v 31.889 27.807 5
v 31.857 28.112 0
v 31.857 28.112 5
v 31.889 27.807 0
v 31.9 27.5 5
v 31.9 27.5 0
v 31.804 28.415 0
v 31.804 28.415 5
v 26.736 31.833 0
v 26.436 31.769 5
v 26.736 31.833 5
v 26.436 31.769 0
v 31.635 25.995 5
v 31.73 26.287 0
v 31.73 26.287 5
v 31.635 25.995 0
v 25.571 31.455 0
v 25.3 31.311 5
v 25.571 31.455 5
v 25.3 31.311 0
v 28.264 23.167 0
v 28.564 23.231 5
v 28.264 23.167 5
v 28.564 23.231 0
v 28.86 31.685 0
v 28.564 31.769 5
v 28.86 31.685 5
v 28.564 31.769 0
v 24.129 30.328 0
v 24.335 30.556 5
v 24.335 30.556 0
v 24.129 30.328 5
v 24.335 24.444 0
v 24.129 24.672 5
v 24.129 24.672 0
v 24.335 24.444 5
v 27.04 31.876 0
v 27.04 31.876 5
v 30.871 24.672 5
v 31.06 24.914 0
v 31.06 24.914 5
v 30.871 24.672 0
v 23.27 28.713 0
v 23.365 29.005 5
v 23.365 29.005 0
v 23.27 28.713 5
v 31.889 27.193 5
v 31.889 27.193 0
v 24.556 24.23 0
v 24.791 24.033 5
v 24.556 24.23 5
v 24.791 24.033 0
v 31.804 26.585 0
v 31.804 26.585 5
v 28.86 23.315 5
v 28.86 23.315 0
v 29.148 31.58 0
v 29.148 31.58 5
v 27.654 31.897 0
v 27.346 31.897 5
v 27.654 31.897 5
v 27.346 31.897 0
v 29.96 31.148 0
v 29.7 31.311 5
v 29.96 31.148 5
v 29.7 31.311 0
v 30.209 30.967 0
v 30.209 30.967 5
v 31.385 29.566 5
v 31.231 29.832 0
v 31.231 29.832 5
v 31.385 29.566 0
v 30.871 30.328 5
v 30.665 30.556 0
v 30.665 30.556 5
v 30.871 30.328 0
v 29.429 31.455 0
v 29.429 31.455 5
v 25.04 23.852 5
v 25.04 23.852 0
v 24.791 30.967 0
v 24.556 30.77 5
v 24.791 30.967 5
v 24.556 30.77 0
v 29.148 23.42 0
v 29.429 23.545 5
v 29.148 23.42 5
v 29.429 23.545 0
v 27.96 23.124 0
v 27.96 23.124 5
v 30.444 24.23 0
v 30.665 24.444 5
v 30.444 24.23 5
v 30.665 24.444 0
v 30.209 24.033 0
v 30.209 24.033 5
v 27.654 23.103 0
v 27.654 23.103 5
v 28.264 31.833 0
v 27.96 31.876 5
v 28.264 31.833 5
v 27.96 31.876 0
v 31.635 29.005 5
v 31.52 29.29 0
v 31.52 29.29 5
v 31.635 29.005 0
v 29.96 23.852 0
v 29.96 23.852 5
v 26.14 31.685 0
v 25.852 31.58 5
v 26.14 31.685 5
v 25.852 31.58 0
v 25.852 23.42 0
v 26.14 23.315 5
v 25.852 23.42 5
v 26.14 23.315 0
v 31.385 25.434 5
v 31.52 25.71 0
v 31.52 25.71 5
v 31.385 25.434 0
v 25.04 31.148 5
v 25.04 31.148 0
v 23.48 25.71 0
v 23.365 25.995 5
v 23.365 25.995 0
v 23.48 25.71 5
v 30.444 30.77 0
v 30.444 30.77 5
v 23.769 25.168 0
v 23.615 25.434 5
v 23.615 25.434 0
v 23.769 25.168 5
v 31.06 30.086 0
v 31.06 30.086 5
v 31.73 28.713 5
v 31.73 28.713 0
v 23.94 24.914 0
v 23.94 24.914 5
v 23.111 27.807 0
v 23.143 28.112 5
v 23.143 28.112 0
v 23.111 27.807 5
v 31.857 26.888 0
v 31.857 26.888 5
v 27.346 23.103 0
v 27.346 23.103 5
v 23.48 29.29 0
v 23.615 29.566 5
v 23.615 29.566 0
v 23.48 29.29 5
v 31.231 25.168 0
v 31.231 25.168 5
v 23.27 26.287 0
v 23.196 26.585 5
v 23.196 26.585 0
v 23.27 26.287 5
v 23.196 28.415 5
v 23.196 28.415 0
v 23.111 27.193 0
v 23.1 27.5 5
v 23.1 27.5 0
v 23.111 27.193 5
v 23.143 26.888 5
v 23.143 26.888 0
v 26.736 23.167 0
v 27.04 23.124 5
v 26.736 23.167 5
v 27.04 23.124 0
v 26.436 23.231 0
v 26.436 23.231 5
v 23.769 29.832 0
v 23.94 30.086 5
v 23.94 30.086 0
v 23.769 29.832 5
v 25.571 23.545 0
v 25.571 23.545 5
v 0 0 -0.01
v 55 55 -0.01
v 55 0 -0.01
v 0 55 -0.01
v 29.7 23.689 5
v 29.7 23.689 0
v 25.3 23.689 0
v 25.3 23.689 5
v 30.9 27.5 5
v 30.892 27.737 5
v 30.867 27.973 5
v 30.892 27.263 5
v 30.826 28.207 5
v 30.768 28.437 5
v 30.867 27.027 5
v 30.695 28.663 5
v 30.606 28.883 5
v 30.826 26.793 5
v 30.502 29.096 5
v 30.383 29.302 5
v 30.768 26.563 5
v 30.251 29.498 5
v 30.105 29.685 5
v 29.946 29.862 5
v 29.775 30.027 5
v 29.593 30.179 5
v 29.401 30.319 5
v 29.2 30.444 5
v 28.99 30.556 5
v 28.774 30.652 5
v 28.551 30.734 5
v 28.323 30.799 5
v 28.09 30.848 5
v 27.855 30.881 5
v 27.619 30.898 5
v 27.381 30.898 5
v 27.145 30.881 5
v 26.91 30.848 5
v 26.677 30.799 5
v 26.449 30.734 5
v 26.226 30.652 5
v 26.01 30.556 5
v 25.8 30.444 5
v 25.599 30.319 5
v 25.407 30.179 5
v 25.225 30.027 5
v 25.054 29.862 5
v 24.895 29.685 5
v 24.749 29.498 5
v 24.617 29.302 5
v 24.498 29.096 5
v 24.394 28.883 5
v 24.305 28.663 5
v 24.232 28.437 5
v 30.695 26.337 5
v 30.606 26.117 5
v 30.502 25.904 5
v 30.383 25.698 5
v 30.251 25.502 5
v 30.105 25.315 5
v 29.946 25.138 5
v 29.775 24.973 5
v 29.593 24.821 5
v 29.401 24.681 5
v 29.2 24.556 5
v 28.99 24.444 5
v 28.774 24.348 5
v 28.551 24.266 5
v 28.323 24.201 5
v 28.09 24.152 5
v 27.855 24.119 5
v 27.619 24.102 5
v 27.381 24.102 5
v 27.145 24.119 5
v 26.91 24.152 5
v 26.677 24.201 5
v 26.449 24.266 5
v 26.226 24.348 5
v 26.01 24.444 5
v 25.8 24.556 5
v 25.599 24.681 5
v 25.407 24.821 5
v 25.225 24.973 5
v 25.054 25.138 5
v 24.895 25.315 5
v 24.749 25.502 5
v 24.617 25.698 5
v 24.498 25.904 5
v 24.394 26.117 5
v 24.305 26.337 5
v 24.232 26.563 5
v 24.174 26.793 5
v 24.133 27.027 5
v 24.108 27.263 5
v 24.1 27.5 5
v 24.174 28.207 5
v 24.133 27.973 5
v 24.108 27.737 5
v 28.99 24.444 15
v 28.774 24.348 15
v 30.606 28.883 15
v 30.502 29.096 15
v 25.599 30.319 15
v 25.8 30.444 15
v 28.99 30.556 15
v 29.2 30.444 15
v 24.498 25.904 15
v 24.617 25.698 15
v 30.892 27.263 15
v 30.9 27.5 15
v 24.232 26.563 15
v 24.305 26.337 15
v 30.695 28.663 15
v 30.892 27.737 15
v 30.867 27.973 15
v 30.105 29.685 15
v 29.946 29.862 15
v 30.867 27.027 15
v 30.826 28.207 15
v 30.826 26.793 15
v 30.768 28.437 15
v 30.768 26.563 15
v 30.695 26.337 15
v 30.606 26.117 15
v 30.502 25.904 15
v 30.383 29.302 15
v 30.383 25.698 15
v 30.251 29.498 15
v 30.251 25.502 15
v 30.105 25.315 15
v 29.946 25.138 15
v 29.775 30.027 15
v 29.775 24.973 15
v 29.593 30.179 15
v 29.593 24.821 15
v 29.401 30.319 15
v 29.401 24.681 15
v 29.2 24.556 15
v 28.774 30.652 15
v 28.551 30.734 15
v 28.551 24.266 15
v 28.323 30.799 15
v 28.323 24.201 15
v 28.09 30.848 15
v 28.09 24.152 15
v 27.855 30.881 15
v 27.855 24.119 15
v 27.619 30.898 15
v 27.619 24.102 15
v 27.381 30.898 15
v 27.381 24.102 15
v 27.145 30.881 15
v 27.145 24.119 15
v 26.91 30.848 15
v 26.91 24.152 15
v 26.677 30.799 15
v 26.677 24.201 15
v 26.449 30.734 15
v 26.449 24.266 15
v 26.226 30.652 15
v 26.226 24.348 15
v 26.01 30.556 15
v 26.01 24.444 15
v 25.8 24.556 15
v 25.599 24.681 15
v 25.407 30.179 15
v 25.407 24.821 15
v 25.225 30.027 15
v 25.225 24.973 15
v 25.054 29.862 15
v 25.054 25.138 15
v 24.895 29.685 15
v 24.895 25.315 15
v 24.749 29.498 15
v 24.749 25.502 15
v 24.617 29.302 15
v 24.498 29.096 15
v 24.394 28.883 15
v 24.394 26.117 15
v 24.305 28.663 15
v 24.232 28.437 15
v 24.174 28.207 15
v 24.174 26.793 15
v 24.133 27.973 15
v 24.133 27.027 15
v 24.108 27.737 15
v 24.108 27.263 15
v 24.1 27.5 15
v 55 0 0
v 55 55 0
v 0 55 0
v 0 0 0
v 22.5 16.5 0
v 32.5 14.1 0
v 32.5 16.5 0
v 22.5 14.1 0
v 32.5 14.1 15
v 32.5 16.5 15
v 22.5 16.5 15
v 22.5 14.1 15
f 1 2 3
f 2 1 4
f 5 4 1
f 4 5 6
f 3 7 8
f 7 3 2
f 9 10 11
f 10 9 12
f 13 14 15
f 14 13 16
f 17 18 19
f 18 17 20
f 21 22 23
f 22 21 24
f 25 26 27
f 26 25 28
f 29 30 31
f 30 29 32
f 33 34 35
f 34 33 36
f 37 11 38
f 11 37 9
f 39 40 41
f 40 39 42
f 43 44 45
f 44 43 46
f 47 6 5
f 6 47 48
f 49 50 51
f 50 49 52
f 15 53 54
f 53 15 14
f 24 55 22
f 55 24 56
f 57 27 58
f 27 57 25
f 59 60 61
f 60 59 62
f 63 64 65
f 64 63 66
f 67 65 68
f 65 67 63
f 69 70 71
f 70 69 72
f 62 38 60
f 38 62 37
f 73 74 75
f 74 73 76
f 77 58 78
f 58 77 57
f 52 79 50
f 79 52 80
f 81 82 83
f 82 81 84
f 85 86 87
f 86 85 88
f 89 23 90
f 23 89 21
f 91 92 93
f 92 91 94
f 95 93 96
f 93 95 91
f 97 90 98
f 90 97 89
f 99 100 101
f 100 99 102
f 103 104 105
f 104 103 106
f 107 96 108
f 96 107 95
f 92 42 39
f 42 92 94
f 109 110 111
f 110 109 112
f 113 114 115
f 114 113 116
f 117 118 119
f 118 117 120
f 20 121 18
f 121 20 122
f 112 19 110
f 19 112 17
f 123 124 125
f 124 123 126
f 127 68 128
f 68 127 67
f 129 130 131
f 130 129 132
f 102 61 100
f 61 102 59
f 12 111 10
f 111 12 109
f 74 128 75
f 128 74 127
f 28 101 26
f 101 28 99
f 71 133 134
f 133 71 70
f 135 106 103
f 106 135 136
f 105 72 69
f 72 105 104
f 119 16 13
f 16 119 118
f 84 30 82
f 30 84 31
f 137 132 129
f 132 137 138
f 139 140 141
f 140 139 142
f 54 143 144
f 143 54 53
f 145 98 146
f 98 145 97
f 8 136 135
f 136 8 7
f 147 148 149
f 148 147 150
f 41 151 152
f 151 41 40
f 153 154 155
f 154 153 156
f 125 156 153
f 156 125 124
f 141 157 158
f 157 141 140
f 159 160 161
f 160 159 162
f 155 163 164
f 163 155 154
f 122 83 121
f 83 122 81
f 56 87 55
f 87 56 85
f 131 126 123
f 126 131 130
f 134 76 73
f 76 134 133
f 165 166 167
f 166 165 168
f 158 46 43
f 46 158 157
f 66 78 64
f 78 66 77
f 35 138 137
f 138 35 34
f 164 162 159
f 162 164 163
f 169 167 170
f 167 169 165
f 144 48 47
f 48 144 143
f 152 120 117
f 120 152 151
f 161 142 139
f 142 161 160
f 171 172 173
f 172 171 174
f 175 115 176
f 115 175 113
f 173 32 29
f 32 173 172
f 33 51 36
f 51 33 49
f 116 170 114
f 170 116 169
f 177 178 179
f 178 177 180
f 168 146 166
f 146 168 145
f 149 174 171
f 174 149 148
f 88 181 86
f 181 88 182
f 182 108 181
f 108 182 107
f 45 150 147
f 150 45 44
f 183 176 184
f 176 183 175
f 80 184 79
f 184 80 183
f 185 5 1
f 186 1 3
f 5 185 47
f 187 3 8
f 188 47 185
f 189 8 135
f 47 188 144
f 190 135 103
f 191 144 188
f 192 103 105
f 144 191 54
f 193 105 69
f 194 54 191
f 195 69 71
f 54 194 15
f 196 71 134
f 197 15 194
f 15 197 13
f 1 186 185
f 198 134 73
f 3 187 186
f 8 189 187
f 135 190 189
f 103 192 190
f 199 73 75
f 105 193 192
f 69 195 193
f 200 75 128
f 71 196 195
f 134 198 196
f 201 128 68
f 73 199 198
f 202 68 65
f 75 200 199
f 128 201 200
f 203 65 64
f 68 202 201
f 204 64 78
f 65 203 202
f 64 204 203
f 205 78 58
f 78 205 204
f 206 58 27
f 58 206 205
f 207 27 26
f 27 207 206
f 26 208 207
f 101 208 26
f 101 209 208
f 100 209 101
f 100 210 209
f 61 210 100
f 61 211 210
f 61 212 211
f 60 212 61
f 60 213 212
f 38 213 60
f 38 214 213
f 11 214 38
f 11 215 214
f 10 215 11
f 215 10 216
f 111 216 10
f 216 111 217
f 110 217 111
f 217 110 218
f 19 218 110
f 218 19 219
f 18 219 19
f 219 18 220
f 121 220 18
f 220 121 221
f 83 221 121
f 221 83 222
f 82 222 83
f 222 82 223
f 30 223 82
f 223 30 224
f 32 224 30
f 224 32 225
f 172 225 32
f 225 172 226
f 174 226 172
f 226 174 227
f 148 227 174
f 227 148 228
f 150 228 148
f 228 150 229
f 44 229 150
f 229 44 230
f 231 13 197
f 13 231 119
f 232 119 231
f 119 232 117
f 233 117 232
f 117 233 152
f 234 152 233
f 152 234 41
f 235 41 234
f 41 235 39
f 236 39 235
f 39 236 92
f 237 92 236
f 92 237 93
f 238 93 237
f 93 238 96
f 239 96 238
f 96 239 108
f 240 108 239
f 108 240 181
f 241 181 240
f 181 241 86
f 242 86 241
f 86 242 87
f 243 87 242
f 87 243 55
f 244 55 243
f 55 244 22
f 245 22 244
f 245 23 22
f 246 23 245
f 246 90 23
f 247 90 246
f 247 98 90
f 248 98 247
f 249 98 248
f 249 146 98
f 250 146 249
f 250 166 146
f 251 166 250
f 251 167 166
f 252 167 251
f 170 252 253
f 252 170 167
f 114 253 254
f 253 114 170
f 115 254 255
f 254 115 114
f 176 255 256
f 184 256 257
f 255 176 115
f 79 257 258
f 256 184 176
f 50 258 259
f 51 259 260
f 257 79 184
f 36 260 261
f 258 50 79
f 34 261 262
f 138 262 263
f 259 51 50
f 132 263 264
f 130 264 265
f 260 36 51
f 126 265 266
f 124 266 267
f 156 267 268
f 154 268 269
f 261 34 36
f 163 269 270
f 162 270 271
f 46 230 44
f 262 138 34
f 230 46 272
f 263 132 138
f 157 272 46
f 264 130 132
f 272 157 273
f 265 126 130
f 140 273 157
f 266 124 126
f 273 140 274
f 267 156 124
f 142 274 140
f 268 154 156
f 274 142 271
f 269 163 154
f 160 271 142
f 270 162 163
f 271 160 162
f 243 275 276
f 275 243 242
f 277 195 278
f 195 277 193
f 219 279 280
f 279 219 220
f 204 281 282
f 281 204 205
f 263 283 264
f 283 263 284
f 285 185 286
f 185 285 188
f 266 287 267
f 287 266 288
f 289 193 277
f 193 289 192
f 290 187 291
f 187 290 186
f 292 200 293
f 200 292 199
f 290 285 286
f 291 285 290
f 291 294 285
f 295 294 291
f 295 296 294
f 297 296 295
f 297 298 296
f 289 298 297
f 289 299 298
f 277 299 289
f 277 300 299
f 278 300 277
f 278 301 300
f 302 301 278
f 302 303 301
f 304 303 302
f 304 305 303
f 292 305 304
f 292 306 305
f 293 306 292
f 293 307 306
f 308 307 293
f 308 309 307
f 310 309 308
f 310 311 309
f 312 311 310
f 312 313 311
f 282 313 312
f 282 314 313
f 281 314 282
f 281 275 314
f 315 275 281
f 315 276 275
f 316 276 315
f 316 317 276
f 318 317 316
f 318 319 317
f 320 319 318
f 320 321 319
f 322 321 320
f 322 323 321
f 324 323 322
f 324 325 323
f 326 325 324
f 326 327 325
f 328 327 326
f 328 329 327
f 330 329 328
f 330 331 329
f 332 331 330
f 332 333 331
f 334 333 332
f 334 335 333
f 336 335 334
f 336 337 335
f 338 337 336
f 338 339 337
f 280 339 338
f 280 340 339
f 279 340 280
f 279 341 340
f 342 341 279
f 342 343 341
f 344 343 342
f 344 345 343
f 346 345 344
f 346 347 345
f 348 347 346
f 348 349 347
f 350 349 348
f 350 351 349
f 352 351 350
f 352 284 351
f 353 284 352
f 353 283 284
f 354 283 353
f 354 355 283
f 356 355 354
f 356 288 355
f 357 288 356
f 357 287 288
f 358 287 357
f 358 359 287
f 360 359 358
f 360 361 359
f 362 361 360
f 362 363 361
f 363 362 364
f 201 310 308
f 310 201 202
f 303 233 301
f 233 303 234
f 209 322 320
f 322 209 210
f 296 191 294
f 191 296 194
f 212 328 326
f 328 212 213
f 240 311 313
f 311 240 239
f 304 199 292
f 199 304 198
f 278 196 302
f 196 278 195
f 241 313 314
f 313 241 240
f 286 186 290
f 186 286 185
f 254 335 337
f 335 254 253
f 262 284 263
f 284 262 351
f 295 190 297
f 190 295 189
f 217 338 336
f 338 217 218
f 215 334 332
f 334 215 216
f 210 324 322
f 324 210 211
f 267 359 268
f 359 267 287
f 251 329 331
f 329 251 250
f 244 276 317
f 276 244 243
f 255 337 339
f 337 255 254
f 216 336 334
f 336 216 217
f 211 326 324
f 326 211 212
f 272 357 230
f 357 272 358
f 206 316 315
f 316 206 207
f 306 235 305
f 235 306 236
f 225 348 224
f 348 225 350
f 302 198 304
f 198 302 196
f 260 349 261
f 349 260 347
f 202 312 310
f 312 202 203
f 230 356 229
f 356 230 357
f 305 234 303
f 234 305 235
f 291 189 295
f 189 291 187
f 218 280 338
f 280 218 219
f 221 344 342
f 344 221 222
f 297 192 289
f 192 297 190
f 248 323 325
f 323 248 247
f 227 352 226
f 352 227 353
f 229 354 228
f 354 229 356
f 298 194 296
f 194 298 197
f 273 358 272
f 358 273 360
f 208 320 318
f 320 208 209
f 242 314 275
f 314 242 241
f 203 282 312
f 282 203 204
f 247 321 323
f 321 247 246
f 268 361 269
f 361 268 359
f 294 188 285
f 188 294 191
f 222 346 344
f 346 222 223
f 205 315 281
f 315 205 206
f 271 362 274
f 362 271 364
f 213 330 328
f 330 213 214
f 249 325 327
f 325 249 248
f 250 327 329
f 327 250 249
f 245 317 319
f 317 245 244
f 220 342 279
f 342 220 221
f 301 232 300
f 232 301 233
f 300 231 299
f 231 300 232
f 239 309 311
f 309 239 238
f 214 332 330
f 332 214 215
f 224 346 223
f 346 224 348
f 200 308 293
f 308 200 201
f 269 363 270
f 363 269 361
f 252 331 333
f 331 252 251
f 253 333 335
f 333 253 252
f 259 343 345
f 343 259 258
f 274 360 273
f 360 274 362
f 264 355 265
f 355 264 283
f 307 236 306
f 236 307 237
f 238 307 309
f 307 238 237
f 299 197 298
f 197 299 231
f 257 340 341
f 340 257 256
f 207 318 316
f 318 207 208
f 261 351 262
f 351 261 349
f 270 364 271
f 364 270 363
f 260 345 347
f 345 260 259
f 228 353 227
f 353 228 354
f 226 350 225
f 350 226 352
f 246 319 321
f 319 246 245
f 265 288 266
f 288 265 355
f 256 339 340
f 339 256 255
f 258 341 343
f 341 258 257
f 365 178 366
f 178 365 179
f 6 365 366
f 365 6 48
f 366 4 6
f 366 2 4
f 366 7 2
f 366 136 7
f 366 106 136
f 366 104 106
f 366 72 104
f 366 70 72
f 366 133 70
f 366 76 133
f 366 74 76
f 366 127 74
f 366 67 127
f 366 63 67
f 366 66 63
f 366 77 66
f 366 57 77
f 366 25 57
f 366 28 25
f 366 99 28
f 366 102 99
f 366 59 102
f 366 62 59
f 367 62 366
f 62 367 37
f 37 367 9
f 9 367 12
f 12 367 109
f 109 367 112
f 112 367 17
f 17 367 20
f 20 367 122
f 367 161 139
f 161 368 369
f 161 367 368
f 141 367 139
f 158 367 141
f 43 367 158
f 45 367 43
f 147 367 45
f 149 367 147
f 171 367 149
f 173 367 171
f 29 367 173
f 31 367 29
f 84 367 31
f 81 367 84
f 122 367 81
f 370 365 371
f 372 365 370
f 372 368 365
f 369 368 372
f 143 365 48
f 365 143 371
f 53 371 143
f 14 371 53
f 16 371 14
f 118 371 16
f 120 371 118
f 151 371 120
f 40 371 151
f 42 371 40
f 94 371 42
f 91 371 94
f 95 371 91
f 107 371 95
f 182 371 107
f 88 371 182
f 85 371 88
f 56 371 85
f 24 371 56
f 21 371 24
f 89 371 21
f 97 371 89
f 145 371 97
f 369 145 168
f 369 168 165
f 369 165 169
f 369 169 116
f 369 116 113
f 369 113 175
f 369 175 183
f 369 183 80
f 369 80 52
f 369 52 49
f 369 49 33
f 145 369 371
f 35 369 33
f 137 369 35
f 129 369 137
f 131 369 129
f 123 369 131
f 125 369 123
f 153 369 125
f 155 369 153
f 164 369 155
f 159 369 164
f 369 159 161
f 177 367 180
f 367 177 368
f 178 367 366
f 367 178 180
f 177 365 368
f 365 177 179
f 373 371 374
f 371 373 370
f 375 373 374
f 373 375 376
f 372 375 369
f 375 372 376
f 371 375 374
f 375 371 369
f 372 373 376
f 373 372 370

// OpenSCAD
// file: ../Base/Rotation.scad
// Fischertechnik Box Foundation
// Geometry Helpers Rotation

include <PlacementOptions.scad>

// getRotatedSpace(space, rotation=NoRotation)
// Rotates the space dependent on the specified rotation

function getRotatedSpace(space, rotation=NoRotation) = [
    (rotation == Rotate90 || rotation == Rotate270) ? space.y : space.x,
    (rotation == Rotate90 || rotation == Rotate270) ? space.x : space.y
];

// Rotates the given space around the fixed left lower corner
// space = the space the children needs as width/depth list [width,depth]
// rotation = 0 Rotate0 degrees, 1 Rotate90 degrees, 2 Rotate180 degrees, 3 Rotate270 degrees (equivalent to -90)

module RotateFix(space, rotation=NoRotation) {
    dy = (rotation == Rotate0 || rotation == Rotate270) ? 0 :
        (rotation == Rotate90) ? space.x :
        space.y;
    dx = (rotation < Rotate180) ? 0 :
        (rotation == Rotate180) ? space.x :
        space.y;
    
    translate([dx, dy, 0])
        rotate([0, 0, rotations[rotation]])
            children();
}
// file: ../Base/Alignment.scad
// Fischertechnik Box Foundation
// Geometry Helpers Alignment

include <PlacementOptions.scad>

// getAlignedX(elementWidth, spaceWidth, align=AlignRight, offset=0)
// Gets the aligned X offset of an element with the given
// width in the given space.
// elementWidth = The width of the element to positon
// spaceWidth = The space where the element should be aligned
// align = 0 AlignLeft, 1 AlignCenter, 2 AlignRight
// offset = an optional offset from the aligned position. When
// aligned left or centered, then positive values are in X direction.
// When aligned right then positive values are in negative X direction.

function getAlignedX(elementWidth, spaceWidth, align=AlignRight, offset=0) =
    (align == AlignLeft) ?
        offset :
        ((align == AlignCenter) ?
        (spaceWidth - elementWidth)/2 + offset :
        spaceWidth - offset - elementWidth);

// getAlignedY(elementDepth, spaceDepth, align=AlignTop, offset=0)
// Gets the aligned Y offset of an element with the given
// depth in the given space.
// elementDepth = The depth of the element to positon
// spaceDepth = The space where the element should be aligned
// align = 0 AlignBottom, 1 AlignCenter, 2 AlignTop
// offset = an optional offset from the aligned position. When
// aligned bottom or centered, then positive values are in Y direction.
// When aligned top then positive values are in negative Y direction.

function getAlignedY(elementDepth, spaceDepth, align=AlignTop, offset=0) =
    (align == AlignBottom) ?
        offset :
        ((align == AlignCenter) ?
        (spaceDepth - elementDepth)/2 + offset :
        spaceDepth - offset - elementDepth);
// file: ../Base/PlacementOptions.scad
// Fischertechnik Box Foundation
// Placement Options

// Alignment
NoAlign = 0;
AlignLeft = 1;
AlignBottom = 2;
AlignCenter = 3;
AlignRight = 4;
AlignTop = 5;

// Element rotation degree steps
rotations = [0, -90, -180, -270];

// Rotation
NoRotation = 0;
Rotate0 = 0;
Rotate90 = 1;
Rotate180 = 2;
Rotate270 = 3;

// Docking (seen from above)
NoDock = -1;
DockLeft = 0;
DockTop = 1;
DockRight = 2;
DockCorner = 2;
DockBottom = 3;

// Web corners
LowerLeft = 0;
UpperLeft = 1;
UpperRight = 2;
LowerRight = 3;

// Web position relative to corner
LeftOfCorner = 0;
RightOfCorner = 1;

// Rails direction
Horizontal = true;
Vertical = false;
// file: ../Base/Boxes.scad
// Fischertechnik Box Foundation
// Pre-designed Boxes

use <Constants.scad>

include <PlacementOptions.scad>

box190Width = 190;
box190Depth = 130;
box130Width = 130;
box130Depth = 95;

// Values are from an original ec3 box
topBottomDifference = 1.5;
outerHeight = 40;
baseThickness = 1.8;
innerHeight = outerHeight - baseThickness;
stackExcess = 5.7;
radius = 3.5;
wallThickness = 1.5;
tolerance = 0.2;

boxWallThickness = wallThickness;
boxBaseThickness = baseThickness;
boxWebWidth = 3.0;

// getBoxWallThickness()
// Gets the wall thickness of a Fischertechnik Box
function getBoxWallThickness() = boxWallThickness;

// getBoxUsageHeight(height = 38.2)
// Gets the usable height of a Fischertechnik box
// height = Outer height of the box from the bottom to the upper edge.
function getBoxUsageHeight(height = outerHeight) = height - baseThickness - stackExcess;

// getBoxInnerHeight()
// Gets the inner height of a Fischertechnik box, including the stack excess
function getBoxInnerHeight() = innerHeight;

// getBoxBaseThickness()
// Gets the thickness of the Fischertechnik box base.
function getBoxBaseThickness() = boxBaseThickness;

// getBoxWebWidth()
// Gets the width of a box web
function getBoxWebWidth() = boxWebWidth;

// getBox190Space()
// Gets the usable inner space of a Box 190 as an x/y-list
function getBox190Space() = [
    box190Width - 2*getBoxWallThickness() - topBottomDifference, 
    box190Depth - 2*getBoxWallThickness() - topBottomDifference ];

// RoundedCornerPlate(width, depth, height, radius)
// Creates a body plate with rounded corners for a box. Used
// also to create the complete box with the hull module.
// width = Width of the plate
// depth = depth of the plate 
// height = thickness of the plate
// radius = radius of the rounded corner
module RoundedCornerPlate(width, depth, height, radius) {
    translate([radius, radius])
    hull() {
        w = width-2*radius;
        d = depth-2*radius;
        cube([w, d, height]);
        cylinder(height, r=radius, $fn=getFragments());
        translate([w, 0])
            cylinder(height, r=radius, $fn=getFragments());
        translate([w, d])
            cylinder(height, r=radius, $fn=getFragments());
        translate([0, d])
            cylinder(height, r=radius, $fn=getFragments());
    }
}

// BoxBase(width, depth)
// Creates an empty stackable Fischertechnik compatible box
// width = Outer width of the box (190, 130, ...)
// depth = Outer depth of the box (130, 95, ...)

module BoxBase(width, depth, height=outerHeight) {    
    thinPlate = 0.01;

    innerHeight = height - baseThickness;    
    
    module Body(tolerance=tolerance) {
        hull() {
            // Bottom with tolerance to fit into the original boxes when stacked
            translate([-wallThickness+tolerance, -wallThickness+tolerance, -baseThickness])
                RoundedCornerPlate(width-topBottomDifference-2*tolerance, depth-topBottomDifference-2*tolerance, thinPlate, radius);
            
            // Top
            translate([-wallThickness-topBottomDifference/2, -wallThickness-topBottomDifference/2, innerHeight-thinPlate])
                RoundedCornerPlate(width, depth, thinPlate, radius);
         }
    }

    module Cutoff() {
        hull() {
            coWidth = width - 2*wallThickness;
            coDepth = depth - 2*wallThickness;
            
            // Bottom
            RoundedCornerPlate(coWidth-topBottomDifference, coDepth-topBottomDifference, thinPlate, radius);

            // Top
            translate([-topBottomDifference/2, -topBottomDifference/2, innerHeight+thinPlate]) 
                RoundedCornerPlate(coWidth, coDepth, thinPlate, radius);
        }
    }
    
    difference() {        
        Body();
        Cutoff();
        stackOffset = innerHeight - stackExcess;
        translate([0, 0, stackOffset + baseThickness])
            Body(tolerance=0);
    }
}

// Creates the Fischertechnik empty box 130x190 mm and places it at position 0,0
// 190x130 are the outer sizes, the inner space is slightly smaller. Use getBox190Space() to get the inner sizes.
// The box is positioned that the usable inner space is at the 0,0,0 position.

module Box190() {
    BoxBase(box190Width, box190Depth);
}

// Gets the usable inner space of a Box 130 as an x/y-list
function getBox130Space() = [
    box130Width - 2*getBoxWallThickness() - topBottomDifference, 
    box130Depth - 2*getBoxWallThickness() - topBottomDifference ];

// Creates the Fischertechnik empty box 95x130 mm and places it at position 0,0
// 190x130 are the outer sizes, the inner space is slightly smaller. Use getBox190Space() to get the inner sizes.
// The box is positioned that the usable inner space is at the 0,0,0 position.

module Box130() {
    BoxBase(box130Width, box130Depth);
}

// Creates a web at the specified box walls
// corner 0 = LowerLeft, 1 = UpperLeft, 2 = UpperRight, 3 = LowerRight
// side 0 = LeftOfCorner, 1 = RightOfCorner
// distance = Distance in mm from the corner
// boxSpace = inner width and depth of the box (default: Box 190)
// webWidth = length of the web (default is 3 mms)
// webThickness = thickness of the web (default is 1 mm)
// height = Height of the web (standard is getBoxUsageHeight())
// sink = How much of the web is sunk into the wall

module BoxWeb(
    corner, 
    side, 
    distance, 
    boxSpace=getBox190Space(), 
    webWidth=getBoxWebWidth(), 
    webThickness=1.0, 
    height=getBoxUsageHeight(),
    sink = getBoxWallThickness()/2) {
    width = (corner % 2 == 0) ? 
            (side == LeftOfCorner ? webWidth : webThickness) :
            (side == LeftOfCorner ? webThickness : webWidth);

    depth = (corner % 2 == 0) ? 
            (side == RightOfCorner ? webWidth : webThickness) :
            (side == RightOfCorner ? webThickness : webWidth);
    
    xDiff = corner == LowerLeft ? 
                (side == LeftOfCorner ? -sink : distance) :
            (corner == UpperLeft ?                
                (side == LeftOfCorner ? distance : -sink) :
            (corner == UpperRight ?
                (side == LeftOfCorner ? boxSpace.x-webWidth+sink : boxSpace.x-distance-webThickness) :
                (side == LeftOfCorner ? boxSpace.x-distance-webThickness: boxSpace.x-webWidth+sink)));

    yDiff = corner == LowerLeft ? 
                (side == RightOfCorner ? -sink : distance) :
            (corner == UpperLeft ?
                (side == RightOfCorner ? boxSpace.y-distance-webThickness : boxSpace.y-webWidth+sink) :
            (corner == UpperRight ?
                (side == RightOfCorner ? boxSpace.y-webWidth+sink : boxSpace.y-distance-webThickness) :
                (side == RightOfCorner ? distance : -sink)));
    
    translate([xDiff, yDiff, -getExcess()])
        cube([width, depth, height + 2*getExcess()]);
}
// file: ../Base/Placement.scad
// Fischertechnik Box Foundation
// Geometry Helpers Placement

use <Constants.scad>
use <Alignment.scad>
use <Rotation.scad>
use <Boxes.scad>

include <PlacementOptions.scad>

// Place(x=0, y=0, elementSpace=[0,0], alignX=AlignLeft, alignY=AlignBottom, rotation=Rotate0, boxSpace=getBox190Space())
// Places the child at the specified position
// y = Y-Position. This is a relative position when an X aligment is specified.
// x = X-Position. This is a relative position when an Y aligment is specified.
// elementSpace = space of the element to be placed [x,y]
// alignX = -1=NoAlign, 0 AlignLeft, 1 AlignCenter, 3 AlignRight (elementSpace and boxSpace required!)
// alignY = -1=NoAlign, 2 AlignBottom, 1 AlignCenter, 4 AlignTop (elementSpace and boxSpace required!)
// rotation = 0 Rotate0 0 degrees, 1 Rotate90 90 degrees, 
// 2 Rotate180 180 degrees, 3 Rotate270 270 degrees (equivalent to -90)
// boxSpace = Inner space of the box where the placement occurs [x,y] - default is Box 190x130 inner space

module Place(x=0, y=0, elementSpace=[0,0], 
  alignX=AlignLeft, alignY=AlignBottom, 
  rotation=NoRotation, boxSpace=getBox190Space()) {

    module Position(x, y, space, rotation=Rotate0) {
        translate([x, y, 0])
            RotateFix(space, rotation)
                children();
    }

    space = getRotatedSpace(elementSpace, rotation);
    alignedX = getAlignedX(space.x, boxSpace.x, alignX, x);
    alignedY = getAlignedY(space.y, boxSpace.y, alignY, y);
    Position(alignedX, alignedY, elementSpace, rotation)
        children();
}

// Center(space=getBox130Space(), elementSpace=[0,0])
// space = Space where the children is centered. For cylinder use centered=true and no elementSpace.
// elementSpace = space of the element to be centered [x,y]

module Center(space=getBox190Space(), elementSpace=[0,0]) {
    Place(elementSpace=elementSpace, boxSpace=space, alignX=AlignCenter, alignY=AlignCenter)
        children();
}

// CenterHorizontal(width=0, y=0, offset=0, space=getBox130Space())
// width = Width of the element to be placed.
// y = Y position of the element
// offset = Offset from the center position (negative will be left of the center)
// space = Space where the element is placed

module CenterHorizontal(width=0, y=0, offset=0, space=getBox190Space()) {
    Place(x=offset, y=y, elementSpace=[width, 0], boxSpace=space, alignX=AlignCenter)
        children(0);
}

// CenterVertical(depth=0, x=0, offset=0, space=getBox130Space())
// depth = Depth of the element to be placed.
// x = X position of the element
// offset = Offset from the center position (negative will be down of the center)
// space = Space where the element is placed

module CenterVertical(depth=0, x=0, offset=0, space=getBox190Space()) {
    Place(x=x, y=offset, elementSpace=[0, depth], boxSpace=space, alignY=AlignCenter)
        children(0);
}

// getIsVertical(align)
// True if the specified alignment needs a vertical orientation for a divider (AlignRight, AlignLeft)

function getIsVertical(align) = (align == AlignRight || align == AlignLeft);

// getIsHorizontal(align)
// True if the specified alignment needs a horizontal orientation for a divider (AlignTop, AlignBottom)

function getIsHorizontal(align) = (align == AlignTop || align == AlignBottom);
// file: ../Base/Constants.scad
// Fischertechnik Box Foundation
// Constants

// Constant values necessary for multiple elements

// Base constants
dividerThickness = 1.2;
excess = 0.01;
fragments = 90;
tolerance = 0.8;

// Gets the thickness of a divider 
function getDividerThickness() = dividerThickness;

// Gets the excess that is used to merge walls into each other
function getExcess() = excess;

// Gets amount of fragments of a cylinder
function getFragments() = fragments;

// Gets the inner tolerance of a frame to each side
function getTolerance() = tolerance;


// Fischertechnik specific constants
axisDiameter = 4;
axisBottomDiameter = axisDiameter + 1;
axisTolerance = 0.2;
axisLockingLength = 8;

// Gets axis diameter of Fischertechnik axis
function getAxisDiameter() = axisDiameter;

// Gets axis diameter tolerance (subtracted for element axis)
function getAxisTolerance() = axisTolerance;

// Gets the axis diameter for standing axis
function getStandAxisDiameter() = getAxisDiameter() - getAxisTolerance();

// Gets axis bottom diameter for thicker part at the bottom
function getAxisBottomDiameter() = axisBottomDiameter;

// Gets the lengthh of the locking part of a locking axis
function getAxisLockingLength() = axisLockingLength;

// Studs

studHeight = 2.5;
studTolerance = 0.2;

// gets the height of a connecting stud
function getStudHeight() = studHeight;

// gets the connecting stud height tolerance
function getStudTolerance() = studTolerance;

// Dockable Frame with Edge

standardEdgeDistance = 2.5;
standardWebDistance = 11.5;
standardCornerLength = 15;

// gets the standard distance to the wall of the box for dockable frames with webs
function getStandardEdgeDistance() = standardEdgeDistance;

// gets the standard distance of each web to the corner of the dockable frame
function getStandardWebDistance() = standardWebDistance;

// gets the standard length of the corner walls of a dockable frame
function getStandardCornerLength() = standardCornerLength;

// Tubes

tubeWallFactor = 0.8;

// gets the wall thickness of a tube.
function getTubeWallThickness() = tubeWallFactor * getDividerThickness();

// Small Parts and Divider Frame

smallPartsFrameHeight = 20;

// gets the frame height for docked small parts boxes.
function getSmallPartsFrameHeight() = smallPartsFrameHeight;

// Hubs

hubRingDiameter = 19.5;
hubRingLevelDiameter = 21;

// gets the diameter of a tube matching the inner ring of a wheel
function getHubRingDiameter() = hubRingDiameter;

// gets the diameter of a hub tube with a thicker diameter
function getHubRingLevelDiameter() = hubRingLevelDiameter;

// Struts

strutAddLength = 9.0;
strutDepth = 8.0;

// gets the full length of a strut
function getFullStrutLength(length) = length + strutAddLength;

// gets the radius of the end of a strut
function getStrutEndRadius() = strutAddLength / 2;

// gets the the depth of a strut
function getStrutDepth() = strutDepth;

// Propeller

propellerAxisDiameter = 7.0;
propellerAxisTolerance = 0.2;

// gets the propeller axis outer diameter
function getPropellerAxisDiameter() = propellerAxisDiameter;

// gets the propeller axis printing tolerance
function getPropellerAxisTolerance() = propellerAxisTolerance;
// main file
// Fischertechnik Box Library
// Holder for four blade propeller
// 36337

use <../Base/Constants.scad>
use <../ModelBase/Simple.scad>

/* [Hidden] */
width = 55;
depth = 55;
height = 15;

// getHolderPropellerFourBladesSpace()
// gets the space for a four blade propeller when placed as an "X".

function getHolderPropellerFourBladesSpace() = [width, depth, height];

// HolderPropellerFourBlades()
// Holder for a four blade propeller when placed as an "X".

module HolderPropellerFourBlades() {
    propellerThickness = 5;
    diameter = getPropellerAxisDiameter() - getPropellerAxisTolerance();
    LeveledAxisWithSpace(
        height, 
        levelHeight=propellerThickness, 
        space=getHolderPropellerFourBladesSpace(),
        diameter=diameter,
        baseDiameter=diameter + 2);
    volume = [10, getDividerThickness()*2, height];
    x = (getHolderPropellerFourBladesSpace().x - volume.x) / 2;
    y = getHolderPropellerFourBladesSpace().y/ 2 - volume.y - 11;
    translate([x, y])
        Wall(volume);
}

// Test
color("lightgray")
HolderPropellerFourBlades();
